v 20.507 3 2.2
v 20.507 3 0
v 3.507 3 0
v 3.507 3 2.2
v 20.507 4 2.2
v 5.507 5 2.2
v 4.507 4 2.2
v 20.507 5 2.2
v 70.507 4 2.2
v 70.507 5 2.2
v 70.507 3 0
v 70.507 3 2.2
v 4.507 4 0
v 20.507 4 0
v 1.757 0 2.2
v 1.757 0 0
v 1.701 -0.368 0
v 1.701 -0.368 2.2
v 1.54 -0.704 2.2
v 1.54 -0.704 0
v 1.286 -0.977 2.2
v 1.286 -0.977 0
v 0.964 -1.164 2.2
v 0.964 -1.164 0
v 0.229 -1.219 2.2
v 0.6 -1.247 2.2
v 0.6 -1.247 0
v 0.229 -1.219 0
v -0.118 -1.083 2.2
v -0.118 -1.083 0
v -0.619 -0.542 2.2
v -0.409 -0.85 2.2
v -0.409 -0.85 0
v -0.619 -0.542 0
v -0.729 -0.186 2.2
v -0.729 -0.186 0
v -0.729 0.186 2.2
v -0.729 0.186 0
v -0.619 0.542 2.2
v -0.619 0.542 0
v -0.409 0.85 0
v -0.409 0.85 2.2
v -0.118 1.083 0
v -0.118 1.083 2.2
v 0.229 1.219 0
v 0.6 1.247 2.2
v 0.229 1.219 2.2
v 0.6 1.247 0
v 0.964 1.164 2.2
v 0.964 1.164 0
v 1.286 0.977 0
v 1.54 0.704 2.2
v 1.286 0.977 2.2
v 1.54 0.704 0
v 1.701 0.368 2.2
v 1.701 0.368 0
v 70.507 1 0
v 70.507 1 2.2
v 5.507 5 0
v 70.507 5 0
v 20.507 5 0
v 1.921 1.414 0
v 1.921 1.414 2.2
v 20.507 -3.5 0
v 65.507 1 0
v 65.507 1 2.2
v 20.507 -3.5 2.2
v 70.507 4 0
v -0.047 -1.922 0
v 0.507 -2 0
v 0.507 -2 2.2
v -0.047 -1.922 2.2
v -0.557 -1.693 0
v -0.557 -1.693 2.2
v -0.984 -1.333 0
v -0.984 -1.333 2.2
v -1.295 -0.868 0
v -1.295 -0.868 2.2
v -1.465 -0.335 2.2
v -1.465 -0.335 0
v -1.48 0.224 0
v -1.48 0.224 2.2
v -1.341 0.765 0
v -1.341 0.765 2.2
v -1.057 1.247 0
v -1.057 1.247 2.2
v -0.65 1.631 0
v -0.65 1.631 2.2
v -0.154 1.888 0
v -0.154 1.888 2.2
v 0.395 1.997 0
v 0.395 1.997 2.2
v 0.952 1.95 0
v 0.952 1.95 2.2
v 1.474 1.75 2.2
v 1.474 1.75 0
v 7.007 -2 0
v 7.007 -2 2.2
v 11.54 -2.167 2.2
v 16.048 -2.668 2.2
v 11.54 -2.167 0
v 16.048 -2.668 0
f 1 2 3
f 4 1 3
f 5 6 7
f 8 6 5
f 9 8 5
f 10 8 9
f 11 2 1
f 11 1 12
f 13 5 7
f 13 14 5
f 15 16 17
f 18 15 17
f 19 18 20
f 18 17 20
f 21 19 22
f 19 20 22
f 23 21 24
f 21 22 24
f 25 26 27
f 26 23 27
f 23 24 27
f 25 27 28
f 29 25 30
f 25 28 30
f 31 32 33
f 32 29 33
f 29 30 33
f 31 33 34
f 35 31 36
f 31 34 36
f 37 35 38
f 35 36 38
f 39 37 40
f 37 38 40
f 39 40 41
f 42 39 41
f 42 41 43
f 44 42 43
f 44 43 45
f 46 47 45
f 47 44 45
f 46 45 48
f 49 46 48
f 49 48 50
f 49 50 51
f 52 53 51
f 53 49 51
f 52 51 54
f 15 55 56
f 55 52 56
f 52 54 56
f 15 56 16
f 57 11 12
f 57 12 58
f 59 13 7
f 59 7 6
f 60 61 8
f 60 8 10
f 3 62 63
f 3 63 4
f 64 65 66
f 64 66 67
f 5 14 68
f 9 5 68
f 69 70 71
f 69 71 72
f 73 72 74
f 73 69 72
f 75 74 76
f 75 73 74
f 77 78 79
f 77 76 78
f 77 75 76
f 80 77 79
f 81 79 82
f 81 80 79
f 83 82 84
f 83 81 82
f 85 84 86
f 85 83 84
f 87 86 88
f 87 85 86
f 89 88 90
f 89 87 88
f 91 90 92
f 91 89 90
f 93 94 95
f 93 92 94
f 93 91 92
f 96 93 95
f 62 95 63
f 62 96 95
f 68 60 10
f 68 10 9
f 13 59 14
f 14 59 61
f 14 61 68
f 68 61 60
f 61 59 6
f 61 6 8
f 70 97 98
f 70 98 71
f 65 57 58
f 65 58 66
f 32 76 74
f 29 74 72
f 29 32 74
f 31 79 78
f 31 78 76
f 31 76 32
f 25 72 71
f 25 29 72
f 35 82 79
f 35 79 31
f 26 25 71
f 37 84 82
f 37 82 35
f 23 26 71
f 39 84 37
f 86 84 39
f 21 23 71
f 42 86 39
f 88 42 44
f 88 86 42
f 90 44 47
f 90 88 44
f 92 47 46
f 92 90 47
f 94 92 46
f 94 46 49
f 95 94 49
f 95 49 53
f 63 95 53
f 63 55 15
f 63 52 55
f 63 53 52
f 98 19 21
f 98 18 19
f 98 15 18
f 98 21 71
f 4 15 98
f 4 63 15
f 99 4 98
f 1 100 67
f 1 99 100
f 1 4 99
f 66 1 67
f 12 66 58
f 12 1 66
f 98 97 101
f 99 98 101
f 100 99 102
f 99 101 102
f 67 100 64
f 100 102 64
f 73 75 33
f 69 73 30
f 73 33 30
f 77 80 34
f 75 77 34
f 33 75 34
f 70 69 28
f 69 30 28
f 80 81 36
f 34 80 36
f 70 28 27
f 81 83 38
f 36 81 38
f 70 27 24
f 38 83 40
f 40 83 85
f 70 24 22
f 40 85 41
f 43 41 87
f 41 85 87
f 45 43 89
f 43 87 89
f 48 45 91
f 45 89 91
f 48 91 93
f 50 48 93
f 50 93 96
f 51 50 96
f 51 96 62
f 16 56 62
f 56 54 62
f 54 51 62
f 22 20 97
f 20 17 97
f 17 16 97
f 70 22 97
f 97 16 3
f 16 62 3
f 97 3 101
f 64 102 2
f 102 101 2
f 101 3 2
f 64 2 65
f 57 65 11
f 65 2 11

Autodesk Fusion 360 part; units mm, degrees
sketch "Sketch1" plane through (0, 0, 0) normal (0, 0, 1) x (1, 0, 0)
  circle A0 centre (0.507, 0) radius 1.25
  line L0 (3.507, 3) -> (2.507, 3)
  line L1 (4.507, 4) -> (5.507, 5)
  line L2 (5.507, 5) -> (20.507, 5)
  arc A1 (1.9212, 1.4142) -> (0.507, -2) centre (0.507, 0) ccw
  line L3 (1.9212, 1.4142) -> (3.507, 3)
  line L4 (20.507, 4) -> (4.507, 4)
  line L5 (20.507, 3) -> (3.507, 3)
  line L6 (20.507, 5) -> (70.507, 5)
  line L7 (20.507, 4) -> (70.507, 4)
  line L8 (20.507, 3) -> (70.507, 3)
  line L9 (70.507, 3) -> (70.507, 1)
  line L10 (70.507, 5) -> (70.507, 4)
  line L11 (70.507, 1) -> (65.507, 1)
  line L12 (65.507, 1) -> (20.507, -3.5)
  line L13 (7.007, -2) -> (0.507, -2)
  arc A2 (20.507, -3.5) -> (7.007, -2) centre (7.007, -63.5) ccw
  dimension "d3" = 2.5
  dimension "d7" = 4
  dimension "d14" = 1
  dimension "d15" = 1
  dimension "d17" = 50
  dimension "d18" = 50
  dimension "d19" = 50
  dimension "d20" = 2
  dimension "d24" = 5
extrude "Extrude4" add sketch "Sketch1" along normal blind 2.2 contours A1 L3 L5 L8 L9 L11 L12 L13 A2 makes body 1
extrude "Extrude5" add sketch "Sketch1" along normal blind 2.2 separate body contours L1 L2 L4 L6 L7 L10 makes body 2
